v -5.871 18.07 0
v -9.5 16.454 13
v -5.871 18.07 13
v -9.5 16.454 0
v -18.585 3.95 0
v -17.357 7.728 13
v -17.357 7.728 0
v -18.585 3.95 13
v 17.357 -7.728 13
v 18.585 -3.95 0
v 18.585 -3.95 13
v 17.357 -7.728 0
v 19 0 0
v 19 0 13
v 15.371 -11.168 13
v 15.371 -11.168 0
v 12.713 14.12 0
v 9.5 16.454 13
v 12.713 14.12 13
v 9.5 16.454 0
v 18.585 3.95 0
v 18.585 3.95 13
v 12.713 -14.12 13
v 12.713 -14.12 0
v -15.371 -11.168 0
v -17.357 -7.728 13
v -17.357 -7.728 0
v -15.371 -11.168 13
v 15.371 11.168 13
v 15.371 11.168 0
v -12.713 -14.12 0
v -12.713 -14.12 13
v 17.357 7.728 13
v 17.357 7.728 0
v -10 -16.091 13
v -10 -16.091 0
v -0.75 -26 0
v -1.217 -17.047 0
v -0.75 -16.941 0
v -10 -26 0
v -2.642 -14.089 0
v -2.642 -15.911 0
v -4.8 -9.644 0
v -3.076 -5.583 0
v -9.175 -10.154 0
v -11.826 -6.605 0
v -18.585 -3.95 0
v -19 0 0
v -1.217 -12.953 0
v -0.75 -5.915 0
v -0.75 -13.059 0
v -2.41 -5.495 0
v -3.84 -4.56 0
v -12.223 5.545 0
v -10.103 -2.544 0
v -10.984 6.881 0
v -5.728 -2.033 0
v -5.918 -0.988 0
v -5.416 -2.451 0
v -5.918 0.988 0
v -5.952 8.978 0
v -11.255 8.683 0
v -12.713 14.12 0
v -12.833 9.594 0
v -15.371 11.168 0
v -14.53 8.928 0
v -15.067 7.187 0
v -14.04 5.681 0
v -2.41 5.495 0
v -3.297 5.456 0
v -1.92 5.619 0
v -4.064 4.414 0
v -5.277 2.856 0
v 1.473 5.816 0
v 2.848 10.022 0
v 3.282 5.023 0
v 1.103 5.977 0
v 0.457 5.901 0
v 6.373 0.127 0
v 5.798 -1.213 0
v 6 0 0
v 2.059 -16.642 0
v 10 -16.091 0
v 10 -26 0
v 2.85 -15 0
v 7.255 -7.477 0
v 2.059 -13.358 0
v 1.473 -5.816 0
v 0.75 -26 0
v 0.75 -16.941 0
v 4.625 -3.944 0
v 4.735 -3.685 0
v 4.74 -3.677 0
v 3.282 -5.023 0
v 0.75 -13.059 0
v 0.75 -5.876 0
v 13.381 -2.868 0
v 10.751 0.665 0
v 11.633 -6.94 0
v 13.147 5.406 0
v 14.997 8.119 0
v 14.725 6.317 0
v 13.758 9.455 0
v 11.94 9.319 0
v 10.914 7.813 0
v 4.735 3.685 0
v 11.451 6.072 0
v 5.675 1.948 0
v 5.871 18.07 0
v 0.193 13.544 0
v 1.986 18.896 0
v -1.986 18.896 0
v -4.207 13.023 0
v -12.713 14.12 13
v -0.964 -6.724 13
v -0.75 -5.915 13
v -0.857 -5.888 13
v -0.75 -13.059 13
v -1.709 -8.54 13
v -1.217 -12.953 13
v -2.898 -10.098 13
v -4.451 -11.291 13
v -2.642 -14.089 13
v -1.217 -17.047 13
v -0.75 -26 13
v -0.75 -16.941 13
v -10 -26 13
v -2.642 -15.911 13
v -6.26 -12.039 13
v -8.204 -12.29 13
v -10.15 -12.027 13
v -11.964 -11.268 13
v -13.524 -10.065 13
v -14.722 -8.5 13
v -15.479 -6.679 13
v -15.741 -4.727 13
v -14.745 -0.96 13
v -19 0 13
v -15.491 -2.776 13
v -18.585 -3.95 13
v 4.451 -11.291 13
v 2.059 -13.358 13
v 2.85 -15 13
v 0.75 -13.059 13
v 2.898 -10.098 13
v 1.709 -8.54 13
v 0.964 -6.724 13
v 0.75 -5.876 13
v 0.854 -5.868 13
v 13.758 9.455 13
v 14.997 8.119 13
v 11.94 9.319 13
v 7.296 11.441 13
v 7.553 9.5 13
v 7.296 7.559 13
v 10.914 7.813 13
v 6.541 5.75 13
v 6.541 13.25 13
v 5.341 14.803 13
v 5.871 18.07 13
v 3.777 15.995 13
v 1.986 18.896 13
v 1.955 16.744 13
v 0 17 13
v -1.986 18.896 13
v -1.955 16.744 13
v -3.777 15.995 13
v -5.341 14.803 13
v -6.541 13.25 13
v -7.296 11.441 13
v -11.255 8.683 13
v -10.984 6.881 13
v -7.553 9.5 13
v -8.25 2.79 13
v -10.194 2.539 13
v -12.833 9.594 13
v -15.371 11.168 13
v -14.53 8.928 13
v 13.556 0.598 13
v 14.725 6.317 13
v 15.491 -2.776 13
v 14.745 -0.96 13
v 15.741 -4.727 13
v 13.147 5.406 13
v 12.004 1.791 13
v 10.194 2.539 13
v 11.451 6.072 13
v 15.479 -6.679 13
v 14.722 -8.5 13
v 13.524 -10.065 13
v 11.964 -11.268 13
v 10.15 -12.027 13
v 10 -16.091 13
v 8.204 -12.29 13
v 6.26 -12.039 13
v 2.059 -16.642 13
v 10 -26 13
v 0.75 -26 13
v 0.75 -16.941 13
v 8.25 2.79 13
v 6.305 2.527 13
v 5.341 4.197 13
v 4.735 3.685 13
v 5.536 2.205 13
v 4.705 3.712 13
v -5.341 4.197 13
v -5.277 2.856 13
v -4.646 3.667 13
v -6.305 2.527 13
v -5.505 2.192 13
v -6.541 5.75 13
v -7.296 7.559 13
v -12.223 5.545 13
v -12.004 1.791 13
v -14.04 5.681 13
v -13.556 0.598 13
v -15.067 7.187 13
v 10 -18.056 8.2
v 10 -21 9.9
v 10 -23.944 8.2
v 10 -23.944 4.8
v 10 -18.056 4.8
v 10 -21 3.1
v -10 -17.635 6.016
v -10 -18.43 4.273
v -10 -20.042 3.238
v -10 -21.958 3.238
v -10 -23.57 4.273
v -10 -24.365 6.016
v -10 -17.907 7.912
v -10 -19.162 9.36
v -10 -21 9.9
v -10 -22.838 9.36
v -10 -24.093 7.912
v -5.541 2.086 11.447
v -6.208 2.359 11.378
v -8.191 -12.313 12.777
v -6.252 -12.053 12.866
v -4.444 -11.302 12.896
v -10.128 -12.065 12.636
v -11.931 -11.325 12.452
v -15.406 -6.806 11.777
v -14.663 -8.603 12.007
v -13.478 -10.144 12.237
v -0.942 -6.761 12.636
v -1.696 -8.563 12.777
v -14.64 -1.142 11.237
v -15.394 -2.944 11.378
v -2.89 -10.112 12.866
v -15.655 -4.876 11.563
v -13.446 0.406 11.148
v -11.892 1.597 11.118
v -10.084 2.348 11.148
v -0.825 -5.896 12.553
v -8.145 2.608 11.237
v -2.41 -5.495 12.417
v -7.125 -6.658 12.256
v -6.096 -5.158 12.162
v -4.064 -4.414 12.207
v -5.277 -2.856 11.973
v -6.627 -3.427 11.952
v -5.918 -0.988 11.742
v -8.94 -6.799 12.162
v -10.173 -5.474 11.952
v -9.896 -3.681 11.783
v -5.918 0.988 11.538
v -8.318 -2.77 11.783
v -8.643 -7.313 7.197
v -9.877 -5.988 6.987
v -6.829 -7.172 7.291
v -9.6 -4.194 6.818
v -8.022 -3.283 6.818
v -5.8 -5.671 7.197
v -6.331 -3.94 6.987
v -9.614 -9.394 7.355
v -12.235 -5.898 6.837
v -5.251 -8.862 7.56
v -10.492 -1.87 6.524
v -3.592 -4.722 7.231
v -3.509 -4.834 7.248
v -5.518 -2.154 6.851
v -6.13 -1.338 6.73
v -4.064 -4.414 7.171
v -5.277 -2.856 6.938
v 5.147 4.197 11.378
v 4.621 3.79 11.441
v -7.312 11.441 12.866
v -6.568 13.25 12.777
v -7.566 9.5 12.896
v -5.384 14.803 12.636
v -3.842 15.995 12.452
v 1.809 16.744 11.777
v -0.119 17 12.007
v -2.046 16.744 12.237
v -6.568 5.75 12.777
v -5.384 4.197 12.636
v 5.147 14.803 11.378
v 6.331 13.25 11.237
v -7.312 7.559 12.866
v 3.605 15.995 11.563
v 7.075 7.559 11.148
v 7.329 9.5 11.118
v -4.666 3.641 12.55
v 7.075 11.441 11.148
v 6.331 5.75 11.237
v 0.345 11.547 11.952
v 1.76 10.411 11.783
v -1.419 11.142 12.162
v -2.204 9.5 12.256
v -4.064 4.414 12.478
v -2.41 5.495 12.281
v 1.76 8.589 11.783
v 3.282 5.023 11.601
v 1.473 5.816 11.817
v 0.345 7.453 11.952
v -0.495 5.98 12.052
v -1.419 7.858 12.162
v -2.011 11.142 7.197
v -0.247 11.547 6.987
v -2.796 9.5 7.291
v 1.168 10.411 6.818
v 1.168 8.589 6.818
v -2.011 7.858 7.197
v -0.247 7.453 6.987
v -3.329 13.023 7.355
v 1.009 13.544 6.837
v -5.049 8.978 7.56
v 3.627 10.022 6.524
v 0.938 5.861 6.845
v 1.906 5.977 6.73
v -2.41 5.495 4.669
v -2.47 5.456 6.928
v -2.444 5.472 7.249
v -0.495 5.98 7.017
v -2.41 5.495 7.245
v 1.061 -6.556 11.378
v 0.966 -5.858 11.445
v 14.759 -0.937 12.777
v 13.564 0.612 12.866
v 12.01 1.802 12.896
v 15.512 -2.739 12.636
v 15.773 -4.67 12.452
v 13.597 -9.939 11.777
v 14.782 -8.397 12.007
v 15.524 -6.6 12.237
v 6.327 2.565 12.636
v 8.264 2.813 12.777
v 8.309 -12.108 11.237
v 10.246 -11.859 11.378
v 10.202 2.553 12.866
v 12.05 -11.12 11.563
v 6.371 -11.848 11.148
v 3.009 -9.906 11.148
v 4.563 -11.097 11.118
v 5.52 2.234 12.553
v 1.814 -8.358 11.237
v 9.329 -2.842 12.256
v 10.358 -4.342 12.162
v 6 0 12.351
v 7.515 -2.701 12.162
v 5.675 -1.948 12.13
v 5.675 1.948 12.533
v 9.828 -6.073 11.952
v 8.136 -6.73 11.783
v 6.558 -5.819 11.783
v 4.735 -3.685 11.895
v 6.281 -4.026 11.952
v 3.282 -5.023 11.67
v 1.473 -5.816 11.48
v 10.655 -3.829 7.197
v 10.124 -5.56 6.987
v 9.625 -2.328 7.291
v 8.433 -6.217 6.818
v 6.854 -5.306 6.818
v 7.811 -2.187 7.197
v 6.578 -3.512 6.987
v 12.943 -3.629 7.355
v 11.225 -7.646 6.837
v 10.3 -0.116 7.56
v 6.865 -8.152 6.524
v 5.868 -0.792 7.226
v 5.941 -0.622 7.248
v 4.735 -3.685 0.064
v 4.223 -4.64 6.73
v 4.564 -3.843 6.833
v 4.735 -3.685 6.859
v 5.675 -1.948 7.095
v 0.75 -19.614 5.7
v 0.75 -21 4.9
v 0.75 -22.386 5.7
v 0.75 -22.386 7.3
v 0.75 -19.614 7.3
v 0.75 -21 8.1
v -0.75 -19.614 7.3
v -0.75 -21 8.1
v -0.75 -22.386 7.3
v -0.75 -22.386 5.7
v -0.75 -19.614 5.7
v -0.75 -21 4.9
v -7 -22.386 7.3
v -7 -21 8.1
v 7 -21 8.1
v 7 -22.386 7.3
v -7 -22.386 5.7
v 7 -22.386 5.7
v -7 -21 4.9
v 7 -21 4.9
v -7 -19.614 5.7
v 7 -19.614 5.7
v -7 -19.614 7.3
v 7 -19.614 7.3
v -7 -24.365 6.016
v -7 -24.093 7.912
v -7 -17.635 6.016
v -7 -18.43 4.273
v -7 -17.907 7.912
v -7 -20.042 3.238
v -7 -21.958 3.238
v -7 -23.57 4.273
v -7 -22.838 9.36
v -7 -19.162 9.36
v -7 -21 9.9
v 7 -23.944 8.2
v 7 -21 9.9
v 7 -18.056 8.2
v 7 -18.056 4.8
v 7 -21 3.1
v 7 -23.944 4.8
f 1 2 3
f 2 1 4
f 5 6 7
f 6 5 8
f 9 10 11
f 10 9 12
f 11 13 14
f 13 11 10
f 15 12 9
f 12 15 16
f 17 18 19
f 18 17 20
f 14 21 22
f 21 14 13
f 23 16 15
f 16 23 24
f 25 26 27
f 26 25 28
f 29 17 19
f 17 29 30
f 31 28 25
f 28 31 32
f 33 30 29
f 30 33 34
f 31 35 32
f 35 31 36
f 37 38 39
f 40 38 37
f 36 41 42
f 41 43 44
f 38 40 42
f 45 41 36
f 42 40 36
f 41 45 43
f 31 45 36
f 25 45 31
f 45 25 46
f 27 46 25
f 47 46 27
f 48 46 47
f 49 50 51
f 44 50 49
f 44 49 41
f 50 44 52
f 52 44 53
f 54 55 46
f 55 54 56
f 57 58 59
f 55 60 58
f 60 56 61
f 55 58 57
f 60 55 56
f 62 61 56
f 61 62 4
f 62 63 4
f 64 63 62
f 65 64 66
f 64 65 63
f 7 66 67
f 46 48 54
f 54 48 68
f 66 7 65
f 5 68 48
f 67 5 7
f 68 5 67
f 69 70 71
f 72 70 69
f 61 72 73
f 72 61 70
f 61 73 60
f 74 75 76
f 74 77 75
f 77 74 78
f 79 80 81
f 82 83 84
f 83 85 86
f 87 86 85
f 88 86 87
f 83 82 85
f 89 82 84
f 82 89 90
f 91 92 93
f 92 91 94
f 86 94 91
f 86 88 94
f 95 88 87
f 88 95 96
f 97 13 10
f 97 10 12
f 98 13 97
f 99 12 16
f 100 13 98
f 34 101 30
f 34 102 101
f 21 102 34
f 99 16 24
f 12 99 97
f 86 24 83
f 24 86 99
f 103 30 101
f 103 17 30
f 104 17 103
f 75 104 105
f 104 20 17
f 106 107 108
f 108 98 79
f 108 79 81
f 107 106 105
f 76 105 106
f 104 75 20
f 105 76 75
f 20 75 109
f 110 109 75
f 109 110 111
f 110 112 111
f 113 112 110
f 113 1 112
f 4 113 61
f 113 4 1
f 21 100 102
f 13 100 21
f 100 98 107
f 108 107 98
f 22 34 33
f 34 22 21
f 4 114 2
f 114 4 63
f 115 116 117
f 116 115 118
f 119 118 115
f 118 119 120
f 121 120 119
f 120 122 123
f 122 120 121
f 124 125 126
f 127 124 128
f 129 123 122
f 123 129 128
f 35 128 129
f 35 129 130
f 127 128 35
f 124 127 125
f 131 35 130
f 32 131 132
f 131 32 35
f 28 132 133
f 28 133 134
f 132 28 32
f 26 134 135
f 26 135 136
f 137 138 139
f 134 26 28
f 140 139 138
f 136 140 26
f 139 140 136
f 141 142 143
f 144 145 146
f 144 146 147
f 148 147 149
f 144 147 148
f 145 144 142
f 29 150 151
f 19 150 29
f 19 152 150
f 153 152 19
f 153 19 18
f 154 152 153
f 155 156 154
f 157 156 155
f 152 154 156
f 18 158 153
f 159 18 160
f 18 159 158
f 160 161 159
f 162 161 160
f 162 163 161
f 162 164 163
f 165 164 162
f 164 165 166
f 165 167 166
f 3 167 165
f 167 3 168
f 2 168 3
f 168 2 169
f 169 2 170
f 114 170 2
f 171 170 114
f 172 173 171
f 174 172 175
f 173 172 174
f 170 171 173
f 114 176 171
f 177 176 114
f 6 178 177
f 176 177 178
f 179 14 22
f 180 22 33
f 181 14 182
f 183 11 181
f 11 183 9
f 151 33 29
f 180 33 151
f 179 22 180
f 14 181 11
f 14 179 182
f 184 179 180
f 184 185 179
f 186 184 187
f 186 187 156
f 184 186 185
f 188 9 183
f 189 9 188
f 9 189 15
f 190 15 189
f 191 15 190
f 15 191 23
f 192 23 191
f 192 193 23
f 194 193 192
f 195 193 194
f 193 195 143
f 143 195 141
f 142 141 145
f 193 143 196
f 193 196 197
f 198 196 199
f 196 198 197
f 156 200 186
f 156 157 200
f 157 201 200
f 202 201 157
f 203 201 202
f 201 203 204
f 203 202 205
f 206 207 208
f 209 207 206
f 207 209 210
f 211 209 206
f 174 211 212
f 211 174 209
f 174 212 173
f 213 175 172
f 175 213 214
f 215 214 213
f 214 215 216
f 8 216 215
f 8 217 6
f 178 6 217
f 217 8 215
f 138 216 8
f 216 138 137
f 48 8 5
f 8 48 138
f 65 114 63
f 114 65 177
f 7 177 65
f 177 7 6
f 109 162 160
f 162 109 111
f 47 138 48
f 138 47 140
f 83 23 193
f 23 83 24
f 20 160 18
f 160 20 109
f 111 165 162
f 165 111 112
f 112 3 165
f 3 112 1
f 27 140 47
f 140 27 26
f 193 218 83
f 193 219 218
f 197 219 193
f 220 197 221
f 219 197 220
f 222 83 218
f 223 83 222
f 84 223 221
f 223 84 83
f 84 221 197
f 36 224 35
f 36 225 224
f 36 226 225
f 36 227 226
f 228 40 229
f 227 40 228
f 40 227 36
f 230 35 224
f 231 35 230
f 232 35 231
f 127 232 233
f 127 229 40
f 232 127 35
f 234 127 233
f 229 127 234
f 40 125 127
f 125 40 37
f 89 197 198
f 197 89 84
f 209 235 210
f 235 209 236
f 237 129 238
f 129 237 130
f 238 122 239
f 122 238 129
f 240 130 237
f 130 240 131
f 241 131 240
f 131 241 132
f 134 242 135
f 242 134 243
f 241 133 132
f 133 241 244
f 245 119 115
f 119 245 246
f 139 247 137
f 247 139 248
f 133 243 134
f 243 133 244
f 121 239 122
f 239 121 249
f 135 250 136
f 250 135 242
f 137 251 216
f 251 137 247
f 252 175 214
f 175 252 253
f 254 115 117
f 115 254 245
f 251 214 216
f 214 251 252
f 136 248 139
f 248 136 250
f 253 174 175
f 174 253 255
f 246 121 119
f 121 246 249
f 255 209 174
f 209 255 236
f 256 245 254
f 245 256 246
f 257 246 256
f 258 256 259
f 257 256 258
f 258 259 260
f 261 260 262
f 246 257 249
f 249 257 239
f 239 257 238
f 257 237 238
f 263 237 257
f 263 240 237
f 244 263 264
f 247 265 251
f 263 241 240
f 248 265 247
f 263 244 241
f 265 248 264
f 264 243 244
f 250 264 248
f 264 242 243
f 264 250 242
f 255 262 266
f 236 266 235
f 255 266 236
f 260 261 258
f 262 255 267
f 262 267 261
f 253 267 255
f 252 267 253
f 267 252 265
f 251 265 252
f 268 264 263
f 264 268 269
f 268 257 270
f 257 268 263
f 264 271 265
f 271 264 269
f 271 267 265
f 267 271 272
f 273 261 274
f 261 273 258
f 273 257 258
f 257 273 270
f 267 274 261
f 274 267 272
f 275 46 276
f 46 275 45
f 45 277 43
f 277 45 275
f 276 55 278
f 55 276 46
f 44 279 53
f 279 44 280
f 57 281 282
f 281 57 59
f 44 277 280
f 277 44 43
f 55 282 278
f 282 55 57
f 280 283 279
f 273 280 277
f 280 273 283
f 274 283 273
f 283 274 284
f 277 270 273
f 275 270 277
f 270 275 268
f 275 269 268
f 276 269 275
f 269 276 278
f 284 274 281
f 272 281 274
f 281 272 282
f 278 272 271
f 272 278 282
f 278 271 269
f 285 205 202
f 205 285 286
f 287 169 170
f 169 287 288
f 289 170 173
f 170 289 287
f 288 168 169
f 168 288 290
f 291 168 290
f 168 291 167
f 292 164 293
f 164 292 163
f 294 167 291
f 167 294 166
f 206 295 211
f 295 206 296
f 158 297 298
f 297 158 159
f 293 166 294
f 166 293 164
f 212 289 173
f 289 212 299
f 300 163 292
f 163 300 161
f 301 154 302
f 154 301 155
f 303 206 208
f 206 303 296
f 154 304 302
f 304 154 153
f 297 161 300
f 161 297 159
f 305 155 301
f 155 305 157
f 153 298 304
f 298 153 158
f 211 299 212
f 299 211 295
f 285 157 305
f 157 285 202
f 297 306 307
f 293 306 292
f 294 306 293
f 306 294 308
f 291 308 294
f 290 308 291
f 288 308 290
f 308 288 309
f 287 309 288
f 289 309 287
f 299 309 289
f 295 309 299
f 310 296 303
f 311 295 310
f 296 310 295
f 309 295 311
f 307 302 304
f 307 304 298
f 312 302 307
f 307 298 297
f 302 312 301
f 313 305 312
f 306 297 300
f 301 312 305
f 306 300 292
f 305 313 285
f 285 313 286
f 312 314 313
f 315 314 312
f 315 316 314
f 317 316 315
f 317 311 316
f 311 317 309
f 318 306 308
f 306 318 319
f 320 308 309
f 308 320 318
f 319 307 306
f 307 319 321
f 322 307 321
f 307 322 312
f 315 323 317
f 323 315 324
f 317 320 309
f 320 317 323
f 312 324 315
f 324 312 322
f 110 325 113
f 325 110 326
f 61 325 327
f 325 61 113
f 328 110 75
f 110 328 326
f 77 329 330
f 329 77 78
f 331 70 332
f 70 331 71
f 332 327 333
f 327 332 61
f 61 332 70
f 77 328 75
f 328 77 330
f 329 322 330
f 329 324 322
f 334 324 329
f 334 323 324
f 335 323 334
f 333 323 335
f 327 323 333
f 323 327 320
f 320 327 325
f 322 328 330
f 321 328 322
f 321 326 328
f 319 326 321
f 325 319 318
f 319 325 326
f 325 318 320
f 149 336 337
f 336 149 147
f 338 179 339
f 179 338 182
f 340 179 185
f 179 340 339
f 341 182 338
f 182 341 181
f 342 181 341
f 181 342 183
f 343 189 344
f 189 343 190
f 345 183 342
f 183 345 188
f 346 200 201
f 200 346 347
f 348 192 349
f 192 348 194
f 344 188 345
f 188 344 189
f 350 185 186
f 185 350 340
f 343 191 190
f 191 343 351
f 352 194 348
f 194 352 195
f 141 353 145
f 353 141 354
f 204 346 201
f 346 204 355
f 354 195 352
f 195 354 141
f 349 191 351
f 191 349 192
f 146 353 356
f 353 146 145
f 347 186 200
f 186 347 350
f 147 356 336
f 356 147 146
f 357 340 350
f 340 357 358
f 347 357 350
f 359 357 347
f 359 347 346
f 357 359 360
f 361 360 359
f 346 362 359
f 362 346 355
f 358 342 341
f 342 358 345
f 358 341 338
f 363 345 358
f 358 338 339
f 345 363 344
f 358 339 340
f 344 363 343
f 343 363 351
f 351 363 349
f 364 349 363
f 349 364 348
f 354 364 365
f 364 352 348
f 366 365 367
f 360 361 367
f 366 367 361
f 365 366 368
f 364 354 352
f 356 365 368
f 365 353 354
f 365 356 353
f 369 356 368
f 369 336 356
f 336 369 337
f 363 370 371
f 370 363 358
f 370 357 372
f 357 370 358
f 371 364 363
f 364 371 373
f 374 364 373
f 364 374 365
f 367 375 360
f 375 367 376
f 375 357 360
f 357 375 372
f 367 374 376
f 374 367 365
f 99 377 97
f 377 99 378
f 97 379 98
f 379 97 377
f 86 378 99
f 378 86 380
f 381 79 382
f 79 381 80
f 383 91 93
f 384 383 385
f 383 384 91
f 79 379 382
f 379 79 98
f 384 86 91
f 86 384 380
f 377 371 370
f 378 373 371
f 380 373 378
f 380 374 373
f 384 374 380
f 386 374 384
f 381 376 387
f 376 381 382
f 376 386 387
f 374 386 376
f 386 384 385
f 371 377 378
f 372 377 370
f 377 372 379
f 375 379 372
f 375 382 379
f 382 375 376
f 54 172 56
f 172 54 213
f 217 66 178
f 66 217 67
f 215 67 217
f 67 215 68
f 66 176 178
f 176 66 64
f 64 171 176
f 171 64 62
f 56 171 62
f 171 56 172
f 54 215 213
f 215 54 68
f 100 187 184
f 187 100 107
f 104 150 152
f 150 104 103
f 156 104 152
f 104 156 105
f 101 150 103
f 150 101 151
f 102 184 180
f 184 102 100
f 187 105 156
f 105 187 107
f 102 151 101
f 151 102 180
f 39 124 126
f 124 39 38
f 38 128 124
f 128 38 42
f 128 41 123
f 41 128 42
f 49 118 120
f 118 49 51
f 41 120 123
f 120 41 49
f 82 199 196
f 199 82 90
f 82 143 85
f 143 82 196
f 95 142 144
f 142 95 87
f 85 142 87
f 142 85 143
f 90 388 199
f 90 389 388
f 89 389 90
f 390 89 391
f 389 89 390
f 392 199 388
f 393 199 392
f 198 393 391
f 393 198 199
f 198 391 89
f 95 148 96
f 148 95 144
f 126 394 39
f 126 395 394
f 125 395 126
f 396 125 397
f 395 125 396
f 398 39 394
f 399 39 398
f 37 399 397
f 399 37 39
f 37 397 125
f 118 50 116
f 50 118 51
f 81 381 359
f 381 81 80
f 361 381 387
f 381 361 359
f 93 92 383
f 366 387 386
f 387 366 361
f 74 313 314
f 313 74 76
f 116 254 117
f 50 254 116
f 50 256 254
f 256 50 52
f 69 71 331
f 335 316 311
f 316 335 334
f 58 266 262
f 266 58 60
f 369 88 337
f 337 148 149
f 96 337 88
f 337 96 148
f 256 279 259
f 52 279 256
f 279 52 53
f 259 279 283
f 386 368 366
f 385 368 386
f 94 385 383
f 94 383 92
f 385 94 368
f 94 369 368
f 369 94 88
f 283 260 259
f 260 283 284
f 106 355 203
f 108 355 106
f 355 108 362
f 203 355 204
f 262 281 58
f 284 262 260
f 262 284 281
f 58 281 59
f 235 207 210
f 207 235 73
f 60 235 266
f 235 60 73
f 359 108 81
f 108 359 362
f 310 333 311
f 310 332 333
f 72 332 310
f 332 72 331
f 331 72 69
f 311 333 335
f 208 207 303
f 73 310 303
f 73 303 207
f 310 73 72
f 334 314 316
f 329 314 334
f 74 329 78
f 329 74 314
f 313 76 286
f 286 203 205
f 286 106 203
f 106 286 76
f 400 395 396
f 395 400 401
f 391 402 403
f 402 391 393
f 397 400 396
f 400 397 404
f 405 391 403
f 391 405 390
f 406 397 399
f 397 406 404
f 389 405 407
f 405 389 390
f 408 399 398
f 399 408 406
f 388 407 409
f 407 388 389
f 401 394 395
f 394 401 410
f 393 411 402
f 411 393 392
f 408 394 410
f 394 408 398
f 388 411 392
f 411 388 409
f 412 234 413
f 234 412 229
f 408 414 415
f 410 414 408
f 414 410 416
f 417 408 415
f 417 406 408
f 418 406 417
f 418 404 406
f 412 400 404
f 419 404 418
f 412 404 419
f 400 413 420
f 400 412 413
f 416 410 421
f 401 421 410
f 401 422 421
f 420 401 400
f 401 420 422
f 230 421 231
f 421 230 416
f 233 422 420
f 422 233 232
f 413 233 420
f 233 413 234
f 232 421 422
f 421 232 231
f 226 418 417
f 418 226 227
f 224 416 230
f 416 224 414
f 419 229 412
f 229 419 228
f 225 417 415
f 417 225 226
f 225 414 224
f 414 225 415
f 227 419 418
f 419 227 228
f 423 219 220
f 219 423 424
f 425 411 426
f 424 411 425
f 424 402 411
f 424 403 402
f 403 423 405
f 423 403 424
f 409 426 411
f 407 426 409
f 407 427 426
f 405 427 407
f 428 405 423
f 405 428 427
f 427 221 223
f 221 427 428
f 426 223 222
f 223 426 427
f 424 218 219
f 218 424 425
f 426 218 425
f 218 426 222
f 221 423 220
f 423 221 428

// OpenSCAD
// file: shapes.scad
// 2D basic shapes
module inverseQuarterCircle(r) {
    difference() {
        square([2*r,2*r]);
        translate([r,r])circle(r=r);
        translate([r,0])square([r,2*r]);
        translate([0,r])square([2*r,r]);
    }
}


module catenary(length=100, width=5, a = 25, step=1) {
    function f(x) = width-(a*cosh(x/length)-a);
    for (i = [-length/2 + step : step : length/2]) {
        //echo("i = ", i, " f(i) = ", f(i));
        polygon([[i-step,0],[i,0],[i,f(i)],[i-step,f(i-step)]]);
    }
}

module trapezoid(base, top, h) {
    polygon([[0,-base/2],[0,base/2],[h,top/2],[h,-top/2]]);
}

module arc(w=1, r, angle) {
    difference() {
        circle(r=r+w/2);
        circle(r=r-w/2);
        rotate(angle/2)translate([-r-w/2,0])square([r*2+w,r*2+w]);
        rotate(180-angle/2)translate([-r-w/2,0])square([r*2+w,r*2+w]);
    }
}

module wedge(r, angle) {
    difference() {
        circle(r=r);
        rotate(angle/2)translate([-r,0])square([r*2,r*2]);
        rotate(180-angle/2)translate([-r,0])square([r*2,r*2]);
    }
}

// 3D basic shapes

module roundedCube(size = [10,10,10],radius=1) {
    hull() {
        // bottom
        translate([size[0]-radius,size[1]-radius,radius])sphere(r=radius,center=true);
        translate([size[0]-radius,radius,radius])sphere(r=radius,center=true);
        translate([radius,size[1]-radius,radius])sphere(r=radius,center=true);
        translate([radius,radius,radius])sphere(r=radius,center=true);
        // top
        translate([size[0]-radius,size[1]-radius,size[2]-radius])sphere(r=radius,center=true);
        translate([size[0]-radius,radius,size[2]-radius])sphere(r=radius,center=true);
        translate([radius,size[1]-radius,size[2]-radius])sphere(r=radius,center=true);
        translate([radius,radius,size[2]-radius])sphere(r=radius,center=true);

    }
}

module roundedCylinder(d, h,rr=1, fn=$fn) {
    translate([0,0,rr])minkowski() {
        cylinder(d=d-2*rr, h=h-2*rr, $fn=fn);
        sphere(r=rr, center = true);
    }
}

module roundedBox(size = [1,1,1],radius=1) {
    hull() {
        translate([size[0]-radius,size[1]-radius,size[2]/2])cylinder(r=radius,h=size[2],center=true);
        translate([size[0]-radius,radius,size[2]/2])cylinder(r=radius,h=size[2],center=true);
        translate([radius,size[1]-radius,size[2]/2])cylinder(r=radius,h=size[2],center=true);
        translate([radius,radius,size[2]/2])cylinder(r=radius,h=size[2],center=true);
    }
}
// file: configuration.scad
LMxUU = 8;				// Choose linear bearing: 8 or 12mm
rodspacing = 175;		// Distance between rods:	175 standard, 190 wide
PVC_pipe_OD = 32;		// Default 32mm
PVC_pipe_ID = 26;	// measure pipe ID to adjust
Drive_pipe_OD = 22.5;	// Drive pipe outter diameter: 22mm default
THREADLESS = true;	// True for use of threadless ball screw in z-bracket
SUPPORTED_ROD = true;	// Rods held by Z-mounts - False for platform mounted (lasercut)
Leadnut_thread = false;// Apply the thread of the leadscrew nut to the Z coupler

ENVELOPE_CHECK = false;

m3_dia = 3.2;
m3_nut_dia = 6.8;
m3_nut_slot = 5.8;
m3_nut_height = 3;

m4_dia = 4.2;
m4_nut_dia = 8.8;
m4_nut_height = 3.8;

m8_dia = 8.2;
m8_nut_dia = 16.5;
m8_nut_height = 6.8;

print_layer_height = 0.25;
// main file
include <configuration.scad>
include <shapes.scad>


pi = 3.1415926536;

module BearingScrew(axis_dia = 8, bearing_od=13, bearing_id=4, bearing_h=5, lead = 3) {
    mount_dia = axis_dia + bearing_od*2+4;
    height=13;
    clamp_width = 20;
    clamp_length = 26;
    clamp_split = 1.5;
    tension_distance = 1;
    
    thread_angle = atan(lead/(8*pi));
    
    translate([0,0,height])rotate([180,0,0]) {
            difference() {
            union() {
                // body
                cylinder(d=mount_dia, h=height);
                // clamp
                translate([-clamp_width/2,0,0])cube(size=[clamp_width, clamp_length, height]);
            }
            // Split
            translate([-clamp_split/2,0,0])cube(size=[clamp_split, clamp_length, height]);
            // Space for axis
            cylinder(d=axis_dia + 4, h=height);
            for (a=[60:120:360]) {
                rotate([0,thread_angle,a]) {
                    // bearing holes
                    translate([0,(axis_dia + bearing_od)/2 - tension_distance, -bearing_h+1 ])cylinder(d=bearing_od + 2, h=bearing_h);
                    // bearing screw holes
                    translate([0,(axis_dia + bearing_od)/2 - tension_distance, -m4_dia ])cylinder(d=m4_dia, h=height*2);
                    // bearing nut holes
                    translate([0,(axis_dia + bearing_od)/2 - tension_distance, 6 ])rotate([0,0,-thread_angle])cylinder(d=m4_nut_dia, h=height, $fn=6);        
                }
                // Mount holes
                rotate([0,0,a-60])translate([0,mount_dia/2-4, -1])cylinder(d=m4_dia, h=height+2);
            }
            // Larger mount hole in clamp
            for (d=[-clamp_split/2,clamp_split/2]) {
                translate([d,mount_dia/2-4, 0])cylinder(d=m4_dia, h=height);
            }
            // clamp screw
            translate([-(clamp_width/2)-1,clamp_length - 5,height/2])rotate([0,90,0])cylinder(d=m3_dia, h=clamp_width+2);
            // screw head
            translate([-(clamp_width/2)-1,clamp_length - 5,height/2])rotate([0,90,0])cylinder(d=m3_nut_dia, h=m3_nut_height+1);
            // nut
            mirror(1,0,0)translate([-(clamp_width/2)-1,clamp_length - 5,height/2])rotate([0,90,0])cylinder(d=m3_nut_dia, h=m3_nut_height+1,$fn=6);

        }
        // print support
//       for (a=[60:120:360]) {
//            color([1,0,0,1])rotate([0,thread_angle,a]) {
//                 // bearing nut holes
//                translate([0,(axis_dia + bearing_od)/2 - tension_distance, 6 ])rotate([0,0,-thread_angle])cylinder(d=m4_nut_dia, h=print_layer_height);        
//            }
//         }
     }
}

module BearingScrewMount(axis_dia = 8, bearing_od=13, thickness=3) {
    mount_dia = axis_dia + bearing_od*2+4;

    base_width = 25;
    
    translate([0,0,thickness])rotate([90,0,0])difference() {
        union() {
            // plate
            hull() {
                translate([0, (mount_dia)/2+thickness+1,0])cylinder(d=mount_dia, h=thickness);
                translate([-mount_dia/2,0,0])cube([mount_dia, thickness, thickness]);
            }
            // bump around axis
            translate([0, (mount_dia)/2+thickness+1,-2])roundedCylinder(d=axis_dia+4, h=thickness+4, rr=3);
            // mount plate
            rotate([90,0,0])translate([-mount_dia/2,-(base_width-thickness)/2,0])roundedBox([mount_dia, base_width, thickness], radius=2);
            // base
            translate([0,-5, thickness/2])intersection() {
                rotate([90,0,0])translate([-mount_dia/2,-(base_width)/2,-base_width-5+thickness])roundedBox([mount_dia, base_width, base_width], radius=2);
                rotate([45,0,0])translate([-mount_dia/2,-(base_width)/2,-(base_width)/2])roundedCube([mount_dia, base_width, base_width], radius=2);
            }
        }
        // base
        translate([-(base_width/2+thickness),0,thickness])roundedCube([mount_dia-2*thickness, base_width/2+1, base_width], radius=2);
        // base
        translate([-(base_width/2+thickness),0,-base_width])roundedCube([mount_dia-2*thickness, base_width/2+1, base_width], radius=2);
        // axis hole
        translate([0, (mount_dia)/2+thickness+1,-2])cylinder(d=axis_dia+1, h=thickness+4);
        translate([0, (mount_dia)/2+thickness+1,0])for (a=[0:120:359]) {
            // Mount holes
            rotate([0,0,a+30])translate([0,mount_dia/2-4, -1])cylinder(d=m4_dia, h=thickness+2);
        }
        // Mount holes
        for (i=[1,-1]) {
            for (j=[1,-1]) {
                translate([i*10,1,j*8+thickness/2])rotate([90,0,0])cylinder(d=m4_dia, h=thickness+2);
            }
        }
    }
}

module BearingScrewAssembly() {
    mount_dia = 38;
    translate([0,0,3])rotate([90,0,0])BearingScrewMount();
    translate([0,-mount_dia/2-7,3])rotate([0,0,90])BearingScrew();
    translate([0,-mount_dia/2-7,0])rotate([0,180,90])BearingScrew();
}

//$fs=1;
//$fa=6;
BearingScrew();
